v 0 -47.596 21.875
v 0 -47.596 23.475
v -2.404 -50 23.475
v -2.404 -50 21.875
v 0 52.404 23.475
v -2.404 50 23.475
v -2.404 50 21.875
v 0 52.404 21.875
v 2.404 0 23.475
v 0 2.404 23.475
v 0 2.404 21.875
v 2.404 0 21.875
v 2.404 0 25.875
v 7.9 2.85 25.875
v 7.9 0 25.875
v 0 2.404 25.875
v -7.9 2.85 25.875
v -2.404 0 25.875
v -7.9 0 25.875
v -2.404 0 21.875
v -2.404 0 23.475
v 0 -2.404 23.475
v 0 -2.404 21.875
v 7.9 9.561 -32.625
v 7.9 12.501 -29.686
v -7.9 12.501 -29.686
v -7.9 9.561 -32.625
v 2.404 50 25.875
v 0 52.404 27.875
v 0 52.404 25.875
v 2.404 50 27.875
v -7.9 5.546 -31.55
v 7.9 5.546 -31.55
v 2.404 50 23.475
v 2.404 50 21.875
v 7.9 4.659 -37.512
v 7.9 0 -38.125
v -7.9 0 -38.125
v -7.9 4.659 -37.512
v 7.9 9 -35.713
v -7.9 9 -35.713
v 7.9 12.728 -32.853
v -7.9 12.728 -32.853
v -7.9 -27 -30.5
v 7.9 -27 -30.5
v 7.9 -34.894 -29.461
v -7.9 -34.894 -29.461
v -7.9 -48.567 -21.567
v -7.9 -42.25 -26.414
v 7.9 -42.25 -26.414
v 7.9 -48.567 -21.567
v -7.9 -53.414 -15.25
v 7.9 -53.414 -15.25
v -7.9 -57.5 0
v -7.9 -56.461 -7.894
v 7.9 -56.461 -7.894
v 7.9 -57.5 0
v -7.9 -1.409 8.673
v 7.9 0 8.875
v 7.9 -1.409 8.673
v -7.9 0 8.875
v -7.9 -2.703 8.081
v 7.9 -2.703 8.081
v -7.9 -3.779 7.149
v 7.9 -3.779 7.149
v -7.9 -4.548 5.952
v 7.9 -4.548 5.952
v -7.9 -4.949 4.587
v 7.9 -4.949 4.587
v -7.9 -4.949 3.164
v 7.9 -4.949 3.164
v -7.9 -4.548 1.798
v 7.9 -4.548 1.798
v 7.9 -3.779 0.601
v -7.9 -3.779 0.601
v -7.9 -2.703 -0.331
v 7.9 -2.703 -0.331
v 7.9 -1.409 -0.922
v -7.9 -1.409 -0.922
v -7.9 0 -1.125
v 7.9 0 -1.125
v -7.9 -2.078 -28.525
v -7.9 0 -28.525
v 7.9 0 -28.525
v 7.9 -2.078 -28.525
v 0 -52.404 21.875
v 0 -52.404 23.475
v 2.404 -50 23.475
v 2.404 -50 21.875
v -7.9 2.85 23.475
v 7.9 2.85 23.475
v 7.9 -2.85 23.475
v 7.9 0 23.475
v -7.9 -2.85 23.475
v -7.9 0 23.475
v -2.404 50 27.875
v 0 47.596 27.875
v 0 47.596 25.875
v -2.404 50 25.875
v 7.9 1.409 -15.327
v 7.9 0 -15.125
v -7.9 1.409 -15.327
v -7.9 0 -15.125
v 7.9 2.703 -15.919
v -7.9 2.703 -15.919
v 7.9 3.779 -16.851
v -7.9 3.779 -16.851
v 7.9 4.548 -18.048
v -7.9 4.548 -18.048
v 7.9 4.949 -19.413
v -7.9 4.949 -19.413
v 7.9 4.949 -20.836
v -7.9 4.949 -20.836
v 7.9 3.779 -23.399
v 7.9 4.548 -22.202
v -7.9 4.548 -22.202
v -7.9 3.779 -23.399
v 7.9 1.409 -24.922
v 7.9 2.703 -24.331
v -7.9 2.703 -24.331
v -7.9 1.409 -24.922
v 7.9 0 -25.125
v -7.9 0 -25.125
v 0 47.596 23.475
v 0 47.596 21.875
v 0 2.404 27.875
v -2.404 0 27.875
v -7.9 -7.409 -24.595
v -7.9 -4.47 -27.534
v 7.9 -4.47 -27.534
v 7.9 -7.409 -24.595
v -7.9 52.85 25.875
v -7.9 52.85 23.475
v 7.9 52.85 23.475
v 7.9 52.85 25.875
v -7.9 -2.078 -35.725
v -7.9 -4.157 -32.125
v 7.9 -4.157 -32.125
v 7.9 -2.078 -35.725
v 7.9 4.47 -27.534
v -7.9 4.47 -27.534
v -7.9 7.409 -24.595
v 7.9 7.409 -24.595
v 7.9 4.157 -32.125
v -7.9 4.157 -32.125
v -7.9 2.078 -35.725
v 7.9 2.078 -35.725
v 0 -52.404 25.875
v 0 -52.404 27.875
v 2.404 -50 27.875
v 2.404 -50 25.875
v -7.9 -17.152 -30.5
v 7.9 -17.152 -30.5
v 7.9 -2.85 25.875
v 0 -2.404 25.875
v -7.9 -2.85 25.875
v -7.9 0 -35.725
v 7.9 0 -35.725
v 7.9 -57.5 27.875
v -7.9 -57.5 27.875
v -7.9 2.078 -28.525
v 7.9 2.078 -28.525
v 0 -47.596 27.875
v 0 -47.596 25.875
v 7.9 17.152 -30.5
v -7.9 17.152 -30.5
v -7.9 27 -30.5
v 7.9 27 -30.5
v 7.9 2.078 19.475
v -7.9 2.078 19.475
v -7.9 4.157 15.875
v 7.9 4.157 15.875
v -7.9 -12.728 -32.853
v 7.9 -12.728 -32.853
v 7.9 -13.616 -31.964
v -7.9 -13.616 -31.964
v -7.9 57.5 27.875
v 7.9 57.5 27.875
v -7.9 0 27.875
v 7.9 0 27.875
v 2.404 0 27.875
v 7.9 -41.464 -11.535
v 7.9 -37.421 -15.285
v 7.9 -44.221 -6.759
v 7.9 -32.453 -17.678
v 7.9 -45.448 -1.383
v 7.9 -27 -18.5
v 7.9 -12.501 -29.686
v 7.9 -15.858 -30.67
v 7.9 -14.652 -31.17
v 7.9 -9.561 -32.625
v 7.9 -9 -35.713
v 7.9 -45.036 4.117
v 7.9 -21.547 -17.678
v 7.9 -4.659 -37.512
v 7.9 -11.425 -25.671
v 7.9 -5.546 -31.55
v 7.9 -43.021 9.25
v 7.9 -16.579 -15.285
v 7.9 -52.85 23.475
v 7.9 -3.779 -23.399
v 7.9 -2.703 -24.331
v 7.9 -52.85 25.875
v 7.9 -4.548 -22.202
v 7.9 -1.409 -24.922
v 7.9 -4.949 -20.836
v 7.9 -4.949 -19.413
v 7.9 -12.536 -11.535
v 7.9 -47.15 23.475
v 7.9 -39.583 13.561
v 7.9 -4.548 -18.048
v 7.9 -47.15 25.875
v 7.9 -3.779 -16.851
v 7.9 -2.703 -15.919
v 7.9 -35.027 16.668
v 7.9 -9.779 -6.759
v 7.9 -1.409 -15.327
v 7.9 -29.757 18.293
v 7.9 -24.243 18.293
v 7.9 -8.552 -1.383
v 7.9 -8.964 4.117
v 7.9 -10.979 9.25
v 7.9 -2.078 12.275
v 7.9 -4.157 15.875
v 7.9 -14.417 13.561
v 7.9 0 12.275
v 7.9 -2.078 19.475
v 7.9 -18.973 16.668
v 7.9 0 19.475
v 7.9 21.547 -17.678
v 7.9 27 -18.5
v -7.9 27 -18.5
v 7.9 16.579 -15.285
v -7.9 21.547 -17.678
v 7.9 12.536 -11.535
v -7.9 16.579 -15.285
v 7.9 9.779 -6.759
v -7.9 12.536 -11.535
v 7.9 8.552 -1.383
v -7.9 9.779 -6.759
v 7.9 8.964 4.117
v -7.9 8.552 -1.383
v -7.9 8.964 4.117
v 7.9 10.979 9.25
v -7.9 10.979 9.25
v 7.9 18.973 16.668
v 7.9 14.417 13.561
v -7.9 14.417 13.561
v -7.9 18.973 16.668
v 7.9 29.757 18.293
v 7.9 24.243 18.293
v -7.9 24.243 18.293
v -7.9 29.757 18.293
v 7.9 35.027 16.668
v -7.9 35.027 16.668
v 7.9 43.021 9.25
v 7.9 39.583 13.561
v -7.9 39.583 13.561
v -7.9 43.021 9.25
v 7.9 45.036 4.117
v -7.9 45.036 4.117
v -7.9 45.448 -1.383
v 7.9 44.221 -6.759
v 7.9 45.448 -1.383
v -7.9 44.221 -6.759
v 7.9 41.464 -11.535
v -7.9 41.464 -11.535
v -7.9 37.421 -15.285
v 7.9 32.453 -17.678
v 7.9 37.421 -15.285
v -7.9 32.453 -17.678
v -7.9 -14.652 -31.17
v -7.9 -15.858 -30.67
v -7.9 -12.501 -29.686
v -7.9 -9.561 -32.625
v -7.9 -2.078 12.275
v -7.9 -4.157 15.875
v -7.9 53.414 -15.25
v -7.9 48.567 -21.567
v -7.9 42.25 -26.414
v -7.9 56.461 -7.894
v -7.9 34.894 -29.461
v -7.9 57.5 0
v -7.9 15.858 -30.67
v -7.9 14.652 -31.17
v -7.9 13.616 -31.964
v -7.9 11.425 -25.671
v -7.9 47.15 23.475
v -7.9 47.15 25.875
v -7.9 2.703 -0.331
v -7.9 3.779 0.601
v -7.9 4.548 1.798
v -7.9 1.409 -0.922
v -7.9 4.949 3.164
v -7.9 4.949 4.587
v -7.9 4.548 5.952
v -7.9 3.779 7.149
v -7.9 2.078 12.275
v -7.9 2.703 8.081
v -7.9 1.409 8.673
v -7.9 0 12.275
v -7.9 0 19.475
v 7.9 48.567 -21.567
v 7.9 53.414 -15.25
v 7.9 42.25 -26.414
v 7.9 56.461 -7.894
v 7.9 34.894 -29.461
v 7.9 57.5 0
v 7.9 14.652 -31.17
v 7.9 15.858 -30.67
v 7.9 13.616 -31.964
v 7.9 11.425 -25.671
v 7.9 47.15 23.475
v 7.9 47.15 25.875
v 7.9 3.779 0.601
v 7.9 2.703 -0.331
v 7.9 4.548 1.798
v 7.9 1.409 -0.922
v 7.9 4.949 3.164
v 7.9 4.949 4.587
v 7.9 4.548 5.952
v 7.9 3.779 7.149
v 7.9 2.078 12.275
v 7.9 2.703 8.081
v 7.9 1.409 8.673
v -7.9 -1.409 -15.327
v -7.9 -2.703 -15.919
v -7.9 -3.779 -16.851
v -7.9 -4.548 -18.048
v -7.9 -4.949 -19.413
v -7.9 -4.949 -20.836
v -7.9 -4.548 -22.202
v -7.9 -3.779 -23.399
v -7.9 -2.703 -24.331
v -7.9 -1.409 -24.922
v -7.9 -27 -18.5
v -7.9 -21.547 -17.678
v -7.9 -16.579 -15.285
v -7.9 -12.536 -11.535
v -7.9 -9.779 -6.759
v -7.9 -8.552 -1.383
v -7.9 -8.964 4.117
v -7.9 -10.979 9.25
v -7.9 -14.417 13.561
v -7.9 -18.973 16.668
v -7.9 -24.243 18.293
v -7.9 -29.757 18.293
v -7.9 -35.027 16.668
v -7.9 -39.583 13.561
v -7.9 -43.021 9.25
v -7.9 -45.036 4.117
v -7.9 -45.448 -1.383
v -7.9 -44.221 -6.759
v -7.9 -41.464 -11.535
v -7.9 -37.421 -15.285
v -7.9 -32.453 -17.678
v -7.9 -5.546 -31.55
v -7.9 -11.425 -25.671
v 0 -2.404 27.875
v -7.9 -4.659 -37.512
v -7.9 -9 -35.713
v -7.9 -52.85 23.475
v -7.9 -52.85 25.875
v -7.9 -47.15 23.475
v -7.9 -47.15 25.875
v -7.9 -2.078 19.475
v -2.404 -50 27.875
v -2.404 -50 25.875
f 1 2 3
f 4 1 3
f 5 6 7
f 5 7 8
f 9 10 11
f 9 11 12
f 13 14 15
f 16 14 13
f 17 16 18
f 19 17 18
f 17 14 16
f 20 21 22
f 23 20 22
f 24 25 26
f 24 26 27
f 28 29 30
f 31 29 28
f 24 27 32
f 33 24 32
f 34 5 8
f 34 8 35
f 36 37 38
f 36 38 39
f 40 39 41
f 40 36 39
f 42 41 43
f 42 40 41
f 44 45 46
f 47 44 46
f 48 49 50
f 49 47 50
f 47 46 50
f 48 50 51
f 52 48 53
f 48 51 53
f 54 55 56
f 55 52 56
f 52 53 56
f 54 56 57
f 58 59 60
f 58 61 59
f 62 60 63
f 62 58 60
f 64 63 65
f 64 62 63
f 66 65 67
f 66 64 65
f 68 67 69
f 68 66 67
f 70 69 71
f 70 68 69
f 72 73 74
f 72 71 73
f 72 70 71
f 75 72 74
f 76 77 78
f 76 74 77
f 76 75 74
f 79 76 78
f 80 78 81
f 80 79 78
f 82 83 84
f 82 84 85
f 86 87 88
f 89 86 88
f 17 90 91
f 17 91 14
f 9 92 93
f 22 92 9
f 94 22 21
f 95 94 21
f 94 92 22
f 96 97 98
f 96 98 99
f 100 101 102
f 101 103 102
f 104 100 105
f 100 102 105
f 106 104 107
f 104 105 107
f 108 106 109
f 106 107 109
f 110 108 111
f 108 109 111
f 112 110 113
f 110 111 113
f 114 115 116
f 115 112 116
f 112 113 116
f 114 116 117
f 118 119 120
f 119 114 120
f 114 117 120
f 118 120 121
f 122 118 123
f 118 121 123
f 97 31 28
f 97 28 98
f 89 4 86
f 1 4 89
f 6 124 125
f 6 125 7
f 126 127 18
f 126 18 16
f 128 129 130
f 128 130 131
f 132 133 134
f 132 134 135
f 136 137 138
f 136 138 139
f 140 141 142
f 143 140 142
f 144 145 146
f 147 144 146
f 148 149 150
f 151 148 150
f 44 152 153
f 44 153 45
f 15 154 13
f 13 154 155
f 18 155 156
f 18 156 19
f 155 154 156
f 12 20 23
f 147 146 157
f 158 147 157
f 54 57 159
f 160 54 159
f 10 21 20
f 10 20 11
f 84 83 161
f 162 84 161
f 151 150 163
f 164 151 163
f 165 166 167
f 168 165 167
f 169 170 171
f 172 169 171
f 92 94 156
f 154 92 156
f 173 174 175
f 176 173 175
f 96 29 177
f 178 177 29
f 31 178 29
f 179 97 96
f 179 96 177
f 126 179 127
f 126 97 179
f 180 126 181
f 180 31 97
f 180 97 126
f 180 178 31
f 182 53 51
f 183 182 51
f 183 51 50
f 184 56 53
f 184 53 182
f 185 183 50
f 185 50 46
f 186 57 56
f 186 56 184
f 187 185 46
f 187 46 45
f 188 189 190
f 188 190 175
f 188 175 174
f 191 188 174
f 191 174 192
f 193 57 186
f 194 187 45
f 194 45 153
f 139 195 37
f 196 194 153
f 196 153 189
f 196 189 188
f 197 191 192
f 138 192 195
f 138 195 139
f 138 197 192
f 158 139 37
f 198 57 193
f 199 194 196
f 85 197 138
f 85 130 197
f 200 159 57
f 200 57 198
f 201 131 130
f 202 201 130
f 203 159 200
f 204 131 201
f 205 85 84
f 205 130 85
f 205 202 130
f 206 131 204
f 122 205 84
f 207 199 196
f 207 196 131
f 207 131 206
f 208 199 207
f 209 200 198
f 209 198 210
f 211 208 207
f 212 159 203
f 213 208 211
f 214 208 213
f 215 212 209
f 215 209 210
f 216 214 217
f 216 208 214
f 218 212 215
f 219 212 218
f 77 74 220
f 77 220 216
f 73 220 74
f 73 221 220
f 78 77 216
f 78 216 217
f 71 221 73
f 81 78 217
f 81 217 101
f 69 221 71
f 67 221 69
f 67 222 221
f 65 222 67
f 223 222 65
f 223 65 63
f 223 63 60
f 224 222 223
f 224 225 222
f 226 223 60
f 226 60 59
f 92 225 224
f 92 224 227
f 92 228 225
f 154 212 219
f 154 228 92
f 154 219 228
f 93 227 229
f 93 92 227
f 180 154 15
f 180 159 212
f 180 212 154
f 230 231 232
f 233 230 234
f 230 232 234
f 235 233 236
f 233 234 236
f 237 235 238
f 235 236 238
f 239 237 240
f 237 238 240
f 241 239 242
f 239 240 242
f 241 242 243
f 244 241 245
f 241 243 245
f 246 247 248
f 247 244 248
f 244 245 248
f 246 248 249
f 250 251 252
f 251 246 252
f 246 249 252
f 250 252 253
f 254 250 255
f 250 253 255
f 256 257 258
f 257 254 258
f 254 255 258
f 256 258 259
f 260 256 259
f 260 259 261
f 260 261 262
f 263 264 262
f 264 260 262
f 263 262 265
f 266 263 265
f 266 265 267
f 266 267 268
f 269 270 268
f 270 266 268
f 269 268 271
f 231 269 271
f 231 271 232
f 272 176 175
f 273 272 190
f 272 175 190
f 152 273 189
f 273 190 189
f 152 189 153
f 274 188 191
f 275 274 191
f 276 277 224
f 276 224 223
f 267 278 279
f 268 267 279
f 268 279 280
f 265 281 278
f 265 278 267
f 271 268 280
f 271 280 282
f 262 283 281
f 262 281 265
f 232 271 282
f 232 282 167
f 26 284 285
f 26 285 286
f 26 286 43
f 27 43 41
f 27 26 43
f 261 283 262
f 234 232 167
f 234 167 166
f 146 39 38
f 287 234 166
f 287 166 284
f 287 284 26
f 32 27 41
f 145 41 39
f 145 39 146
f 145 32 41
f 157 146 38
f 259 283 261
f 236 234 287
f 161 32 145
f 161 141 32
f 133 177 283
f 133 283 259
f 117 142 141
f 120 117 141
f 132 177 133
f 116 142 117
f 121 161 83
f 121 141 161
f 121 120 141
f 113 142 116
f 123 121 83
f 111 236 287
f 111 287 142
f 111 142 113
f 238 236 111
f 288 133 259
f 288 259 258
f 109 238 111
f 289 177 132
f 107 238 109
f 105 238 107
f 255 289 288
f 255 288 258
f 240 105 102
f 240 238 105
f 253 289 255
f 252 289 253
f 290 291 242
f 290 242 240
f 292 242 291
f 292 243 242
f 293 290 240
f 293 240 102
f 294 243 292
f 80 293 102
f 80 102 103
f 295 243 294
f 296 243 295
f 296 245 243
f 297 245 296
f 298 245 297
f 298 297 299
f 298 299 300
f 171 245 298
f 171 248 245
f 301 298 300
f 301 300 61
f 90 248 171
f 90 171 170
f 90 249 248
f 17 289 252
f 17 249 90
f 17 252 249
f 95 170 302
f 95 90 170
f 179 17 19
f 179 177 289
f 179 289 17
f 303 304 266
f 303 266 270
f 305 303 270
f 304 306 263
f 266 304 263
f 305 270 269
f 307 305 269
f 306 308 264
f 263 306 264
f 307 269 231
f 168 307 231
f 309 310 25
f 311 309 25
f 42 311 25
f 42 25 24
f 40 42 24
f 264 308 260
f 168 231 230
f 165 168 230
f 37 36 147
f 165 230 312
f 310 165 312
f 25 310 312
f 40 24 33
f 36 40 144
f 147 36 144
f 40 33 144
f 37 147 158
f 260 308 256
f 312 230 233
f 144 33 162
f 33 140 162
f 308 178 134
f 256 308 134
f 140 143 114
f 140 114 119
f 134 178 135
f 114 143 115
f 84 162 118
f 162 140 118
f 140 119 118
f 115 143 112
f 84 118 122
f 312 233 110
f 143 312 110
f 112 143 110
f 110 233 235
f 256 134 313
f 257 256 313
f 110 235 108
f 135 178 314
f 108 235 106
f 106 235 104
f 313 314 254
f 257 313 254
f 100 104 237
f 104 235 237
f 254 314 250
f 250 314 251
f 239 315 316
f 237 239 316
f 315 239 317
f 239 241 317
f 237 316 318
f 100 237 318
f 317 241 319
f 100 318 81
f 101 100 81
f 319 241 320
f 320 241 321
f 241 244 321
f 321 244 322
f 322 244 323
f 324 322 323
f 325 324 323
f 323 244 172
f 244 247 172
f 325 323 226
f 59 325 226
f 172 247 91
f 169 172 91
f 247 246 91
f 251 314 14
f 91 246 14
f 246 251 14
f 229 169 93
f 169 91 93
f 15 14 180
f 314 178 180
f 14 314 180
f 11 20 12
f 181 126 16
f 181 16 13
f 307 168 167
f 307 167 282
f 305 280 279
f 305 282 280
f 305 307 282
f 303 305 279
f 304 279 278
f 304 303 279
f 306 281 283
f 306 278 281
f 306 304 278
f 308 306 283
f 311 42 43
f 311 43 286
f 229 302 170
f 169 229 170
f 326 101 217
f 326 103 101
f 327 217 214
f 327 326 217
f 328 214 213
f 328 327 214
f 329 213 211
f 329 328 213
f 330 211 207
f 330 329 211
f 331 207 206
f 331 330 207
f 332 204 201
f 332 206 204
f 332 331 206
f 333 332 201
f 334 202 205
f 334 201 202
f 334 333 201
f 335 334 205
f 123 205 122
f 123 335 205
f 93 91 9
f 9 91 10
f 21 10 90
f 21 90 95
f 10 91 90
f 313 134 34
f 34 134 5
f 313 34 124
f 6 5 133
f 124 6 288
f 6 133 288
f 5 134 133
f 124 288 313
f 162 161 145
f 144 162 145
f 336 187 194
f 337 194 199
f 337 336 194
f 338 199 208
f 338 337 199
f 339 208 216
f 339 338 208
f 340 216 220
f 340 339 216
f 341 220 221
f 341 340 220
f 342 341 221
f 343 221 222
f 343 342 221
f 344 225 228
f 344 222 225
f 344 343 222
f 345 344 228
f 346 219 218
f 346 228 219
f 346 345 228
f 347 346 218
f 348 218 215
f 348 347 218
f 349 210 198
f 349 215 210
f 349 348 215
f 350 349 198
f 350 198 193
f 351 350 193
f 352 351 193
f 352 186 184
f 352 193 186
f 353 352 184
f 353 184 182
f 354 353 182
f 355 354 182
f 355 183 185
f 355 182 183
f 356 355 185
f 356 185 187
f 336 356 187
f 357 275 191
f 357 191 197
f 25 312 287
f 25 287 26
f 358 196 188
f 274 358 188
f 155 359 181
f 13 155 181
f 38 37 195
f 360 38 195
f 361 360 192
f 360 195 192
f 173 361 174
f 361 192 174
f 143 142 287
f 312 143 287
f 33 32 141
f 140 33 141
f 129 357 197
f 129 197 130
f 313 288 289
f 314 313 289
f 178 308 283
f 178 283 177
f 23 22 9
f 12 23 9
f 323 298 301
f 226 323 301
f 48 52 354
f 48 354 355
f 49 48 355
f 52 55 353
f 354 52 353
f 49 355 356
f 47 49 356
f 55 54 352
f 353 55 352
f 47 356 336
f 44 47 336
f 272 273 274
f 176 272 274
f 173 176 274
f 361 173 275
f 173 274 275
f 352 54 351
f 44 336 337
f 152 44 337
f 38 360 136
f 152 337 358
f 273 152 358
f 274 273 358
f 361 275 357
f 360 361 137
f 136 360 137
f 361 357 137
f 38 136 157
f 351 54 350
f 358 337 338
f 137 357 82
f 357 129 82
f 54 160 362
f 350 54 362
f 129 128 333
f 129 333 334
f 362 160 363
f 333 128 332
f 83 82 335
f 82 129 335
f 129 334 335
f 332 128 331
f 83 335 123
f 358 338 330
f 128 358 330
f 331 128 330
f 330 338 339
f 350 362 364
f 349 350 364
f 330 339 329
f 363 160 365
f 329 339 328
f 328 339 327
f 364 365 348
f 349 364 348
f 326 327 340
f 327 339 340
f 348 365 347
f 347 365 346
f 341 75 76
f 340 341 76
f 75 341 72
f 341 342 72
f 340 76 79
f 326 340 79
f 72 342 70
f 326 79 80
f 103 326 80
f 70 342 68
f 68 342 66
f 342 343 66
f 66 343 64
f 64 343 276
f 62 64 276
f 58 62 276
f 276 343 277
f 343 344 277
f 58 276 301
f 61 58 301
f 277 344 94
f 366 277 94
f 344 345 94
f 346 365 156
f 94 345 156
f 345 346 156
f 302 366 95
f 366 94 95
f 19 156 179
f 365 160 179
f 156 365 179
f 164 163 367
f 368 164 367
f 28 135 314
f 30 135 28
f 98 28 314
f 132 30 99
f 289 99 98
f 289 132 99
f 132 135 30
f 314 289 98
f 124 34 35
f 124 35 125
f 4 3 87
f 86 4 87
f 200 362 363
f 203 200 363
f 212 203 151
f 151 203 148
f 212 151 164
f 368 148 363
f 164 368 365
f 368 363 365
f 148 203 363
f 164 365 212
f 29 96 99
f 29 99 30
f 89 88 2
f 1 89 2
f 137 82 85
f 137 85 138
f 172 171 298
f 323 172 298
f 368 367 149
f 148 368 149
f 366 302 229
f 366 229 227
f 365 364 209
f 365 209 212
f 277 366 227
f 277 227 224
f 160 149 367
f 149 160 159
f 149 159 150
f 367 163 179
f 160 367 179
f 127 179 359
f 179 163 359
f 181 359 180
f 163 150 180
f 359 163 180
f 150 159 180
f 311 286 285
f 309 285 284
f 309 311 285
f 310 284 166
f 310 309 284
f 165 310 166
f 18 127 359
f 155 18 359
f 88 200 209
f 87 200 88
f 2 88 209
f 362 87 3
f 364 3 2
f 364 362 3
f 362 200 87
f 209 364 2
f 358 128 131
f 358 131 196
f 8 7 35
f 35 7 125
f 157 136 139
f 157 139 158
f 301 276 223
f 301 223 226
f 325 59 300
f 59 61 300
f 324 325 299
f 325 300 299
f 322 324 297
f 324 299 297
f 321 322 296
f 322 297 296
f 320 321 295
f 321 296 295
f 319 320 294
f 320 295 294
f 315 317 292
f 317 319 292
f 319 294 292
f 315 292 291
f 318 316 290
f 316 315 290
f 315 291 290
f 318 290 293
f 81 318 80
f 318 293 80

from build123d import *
from build123d.topology import SkipClean

# Parameters (mm, degrees)
BOSS_EXTRUDE1_DEPTH     = 8
CUT_EXTRUDE1_DEPTH      = 78.453287602
CUT_EXTRUDE1_DEPTH_BACK = 70.453287602
CUT_EXTRUDE1_START      = -8
SKETCH9_R               = 5
CUT_EXTRUDE2_DEPTH      = 70.453287602
CUT_EXTRUDE2_DEPTH_BACK = 70.453287602
CUT_EXTRUDE3_DEPTH      = 70.453287602
CUT_EXTRUDE3_DEPTH_BACK = 70.453287602
SKETCH11_R              = 18.5
CUT_EXTRUDE4_DEPTH      = 70.453287602
CUT_EXTRUDE4_DEPTH_BACK = 70.453287602
SKETCH12_W              = 5.7
SKETCH12_H              = 2.4
CUT_EXTRUDE5_START      = 27.875085
CUT_EXTRUDE5_DEPTH      = 6
MOVE_START              = -8
MOVE_FACE1_OUTLINE_W    = 5.7
MOVE_FACE1_OUTLINE_H    = 2.4
MOVE_FACE1_OUTLINE_R    = 18.5
MOVE_FACE1_DEPTH        = 0.1
MOVE_START_2            = 7.9
MOVE_FACE1_2_OUTLINE_W  = 5.7
MOVE_FACE1_2_OUTLINE_H  = 2.4
MOVE_FACE1_2_OUTLINE_R  = 18.5
MOVE_FACE1_2_DEPTH      = 0.1


# Read off the part's stored shape, not the designer's step: Move Face1
with BuildPart() as part:
    # Sketch2 → Boss-Extrude1 (new, symmetric)
    with BuildSketch(Plane.YZ):
        with BuildLine():
            Line((-12.727922061, -32.852837258), (-13.616293225, -31.964466094))
            ThreePointArc((-13.616293225, -31.964466094), (-15.238409969, -30.880602337), (-17.151827131, -30.5))
            Line((-17.151827131, -30.5), (-27, -30.5))
            ThreePointArc((-27, -30.5), (-48.566756826, -21.566756826), (-57.5, 0))
            Line((-57.5, 0), (-57.5, 27.875084803))
            Line((-57.5, 27.875084803), (0, 27.875084803))
            Line((0, 27.875084803), (0, -38.124915197))
            ThreePointArc((0, -38.124915197), (-6.888301783, -36.754746782), (-12.727922061, -32.852837258))
        make_face()
    extrude(amount=BOSS_EXTRUDE1_DEPTH, both=True)

    # Sketch9 → Cut-Extrude1 (cut, two sides: drawn at the far end of the back side and taken through both)
    with BuildSketch(Plane.YZ.offset(CUT_EXTRUDE1_START - CUT_EXTRUDE1_DEPTH_BACK)):
        with Locations((0, 3.875084803)):
            Circle(SKETCH9_R)
        with Locations((0, -20.124915197)):
            Circle(SKETCH9_R)
    extrude(amount=CUT_EXTRUDE1_DEPTH + CUT_EXTRUDE1_DEPTH_BACK, mode=Mode.SUBTRACT)

    # Sketch10 → Cut-Extrude2 (cut, two sides: drawn at the far end of the back side and taken through both)
    with BuildSketch(Plane.YZ.offset(-CUT_EXTRUDE2_DEPTH_BACK)):
        Polygon((2.078460969, 12.275084803), (4.156921938, 15.875084803), (2.078460969, 19.475084803), (-2.078460969, 19.475084803), (-4.156921938, 15.875084803), (-2.078460969, 12.275084803), align=None)
        Polygon((-5.545893683, -31.549584262), (-4.470003116, -27.534306004), (-7.409390808, -24.594918313), (-11.424669066, -25.67080888), (-12.500559632, -29.686087138), (-9.561171941, -32.625474829), align=None)
        Polygon((4.156921938, -32.124915197), (2.078460969, -28.524915197), (-2.078460969, -28.524915197), (-4.156921938, -32.124915197), (-2.078460969, -35.724915197), (2.078460969, -35.724915197), align=None)
        Polygon((12.500559632, -29.686087138), (11.424669066, -25.67080888), (7.409390808, -24.594918313), (4.470003116, -27.534306004), (5.545893683, -31.549584262), (9.561171941, -32.625474829), align=None)
    extrude(amount=CUT_EXTRUDE2_DEPTH + CUT_EXTRUDE2_DEPTH_BACK, mode=Mode.SUBTRACT)

    # Sketch11 → Cut-Extrude3 (cut, two sides: drawn at the far end of the back side and taken through both)
    with BuildSketch(Plane.YZ.offset(-CUT_EXTRUDE3_DEPTH_BACK)):
        with Locations(Location((-27, 0, 0), (0, 0, 270))):
            Circle(SKETCH11_R)
    extrude(amount=CUT_EXTRUDE3_DEPTH + CUT_EXTRUDE3_DEPTH_BACK, mode=Mode.SUBTRACT)

    # Sketch12 → Cut-Extrude4 (cut, two sides: drawn at the far end of the back side and taken through both)
    with BuildSketch(Plane.YZ.offset(-CUT_EXTRUDE4_DEPTH_BACK)):
        with Locations((-50, 24.675084803)):
            Rectangle(SKETCH12_W, SKETCH12_H)
        with Locations((0, 24.675084803)):
            Rectangle(SKETCH12_W, SKETCH12_H)
    extrude(amount=CUT_EXTRUDE4_DEPTH + CUT_EXTRUDE4_DEPTH_BACK, mode=Mode.SUBTRACT)

    # Sketch13 → Cut-Extrude5 (cut)
    with BuildSketch(Plane.XY.offset(CUT_EXTRUDE5_START)):
        Polygon((0, -2.404163056), (2.404163056, 0), (0, 2.404163056), (-2.404163056, 0), align=None)
        Polygon((0, -52.404163056), (2.404163056, -50), (0, -47.595836944), (-2.404163056, -50), align=None)
    extrude(amount=-CUT_EXTRUDE5_DEPTH, mode=Mode.SUBTRACT)

    # Move Face1 outline → Move Face1 (cut)
    with BuildSketch(Plane.YZ.offset(MOVE_START)):
        with BuildLine():
            Line((-2.85, 25.875084803), (0, 25.875084803))
            Line((0, 25.875084803), (0, 27.875084803))
            Line((0, 27.875084803), (-57.5, 27.875084803))
            Line((-57.5, 27.875084803), (-57.5, 0))
            ThreePointArc((-57.5, 0), (-48.566756826, -21.566756826), (-27, -30.5))
            Line((-27, -30.5), (-17.151827131, -30.5))
            ThreePointArc((-17.151827131, -30.5), (-15.238409969, -30.880602337), (-13.616293225, -31.964466094))
            Line((-13.616293225, -31.964466094), (-12.727922061, -32.852837258))
            ThreePointArc((-12.727922061, -32.852837258), (-6.888301783, -36.754746782), (0, -38.124915197))
            Line((0, -38.124915197), (0, -35.724915197))
            Line((0, -35.724915197), (-2.078460969, -35.724915197))
            Line((-2.078460969, -35.724915197), (-4.156921938, -32.124915197))
            Line((-4.156921938, -32.124915197), (-2.078460969, -28.524915197))
            Line((-2.078460969, -28.524915197), (0, -28.524915197))
            Line((0, -28.524915197), (0, -25.124915197))
            ThreePointArc((0, -25.124915197), (-5, -20.124915197), (0, -15.124915197))
            Line((0, -15.124915197), (0, -1.124915197))
            ThreePointArc((0, -1.124915197), (-5, 3.875084803), (0, 8.875084803))
            Line((0, 8.875084803), (0, 12.275084803))
            Line((0, 12.275084803), (-2.078460969, 12.275084803))
            Line((-2.078460969, 12.275084803), (-4.156921938, 15.875084803))
            Line((-4.156921938, 15.875084803), (-2.078460969, 19.475084803))
            Line((-2.078460969, 19.475084803), (0, 19.475084803))
            Line((0, 19.475084803), (0, 23.475084803))
            Line((0, 23.475084803), (-2.85, 23.475084803))
            Line((-2.85, 23.475084803), (-2.85, 25.875084803))
        make_face()
        Polygon((-5.545893683, -31.549584262), (-9.561171941, -32.625474829), (-12.500559632, -29.686087138), (-11.424669066, -25.67080888), (-7.409390808, -24.594918313), (-4.470003116, -27.534306004), align=None, mode=Mode.SUBTRACT)
        with Locations((-50, 24.675084803)):
            Rectangle(MOVE_FACE1_OUTLINE_W, MOVE_FACE1_OUTLINE_H, mode=Mode.SUBTRACT)
        with Locations((-27, 0)):
            Circle(MOVE_FACE1_OUTLINE_R, mode=Mode.SUBTRACT)
    extrude(amount=MOVE_FACE1_DEPTH, mode=Mode.SUBTRACT)

    # Move Face1 2 outline → Move Face1 2 (cut)
    with BuildSketch(Plane.YZ.offset(MOVE_START_2)):
        with BuildLine():
            Line((-2.85, 25.875084803), (0, 25.875084803))
            Line((0, 25.875084803), (0, 27.875084803))
            Line((0, 27.875084803), (-57.5, 27.875084803))
            Line((-57.5, 27.875084803), (-57.5, 0))
            ThreePointArc((-57.5, 0), (-48.566756826, -21.566756826), (-27, -30.5))
            Line((-27, -30.5), (-17.151827131, -30.5))
            ThreePointArc((-17.151827131, -30.5), (-15.238409969, -30.880602337), (-13.616293225, -31.964466094))
            Line((-13.616293225, -31.964466094), (-12.727922061, -32.852837258))
            ThreePointArc((-12.727922061, -32.852837258), (-6.888301783, -36.754746782), (0, -38.124915197))
            Line((0, -38.124915197), (0, -35.724915197))
            Line((0, -35.724915197), (-2.078460969, -35.724915197))
            Line((-2.078460969, -35.724915197), (-4.156921938, -32.124915197))
            Line((-4.156921938, -32.124915197), (-2.078460969, -28.524915197))
            Line((-2.078460969, -28.524915197), (0, -28.524915197))
            Line((0, -28.524915197), (0, -25.124915197))
            ThreePointArc((0, -25.124915197), (-5, -20.124915197), (0, -15.124915197))
            Line((0, -15.124915197), (0, -1.124915197))
            ThreePointArc((0, -1.124915197), (-5, 3.875084803), (0, 8.875084803))
            Line((0, 8.875084803), (0, 12.275084803))
            Line((0, 12.275084803), (-2.078460969, 12.275084803))
            Line((-2.078460969, 12.275084803), (-4.156921938, 15.875084803))
            Line((-4.156921938, 15.875084803), (-2.078460969, 19.475084803))
            Line((-2.078460969, 19.475084803), (0, 19.475084803))
            Line((0, 19.475084803), (0, 23.475084803))
            Line((0, 23.475084803), (-2.85, 23.475084803))
            Line((-2.85, 23.475084803), (-2.85, 25.875084803))
        make_face()
        Polygon((-5.545893683, -31.549584262), (-9.561171941, -32.625474829), (-12.500559632, -29.686087138), (-11.424669066, -25.67080888), (-7.409390808, -24.594918313), (-4.470003116, -27.534306004), align=None, mode=Mode.SUBTRACT)
        with Locations((-50, 24.675084803)):
            Rectangle(MOVE_FACE1_2_OUTLINE_W, MOVE_FACE1_2_OUTLINE_H, mode=Mode.SUBTRACT)
        with Locations((-27, 0)):
            Circle(MOVE_FACE1_2_OUTLINE_R, mode=Mode.SUBTRACT)
    extrude(amount=MOVE_FACE1_2_DEPTH, mode=Mode.SUBTRACT)

    # Mirror1: part across plane


with BuildPart() as part_1:
    with SkipClean():  # the faces are left unmerged after this step: merging them gives an invalid solid
        add(part.part)
        add(part.part.mirror(Plane(origin=(0, 0, 0), x_dir=(0, 0, 1), z_dir=(0, -1, 0))))


solid = part_1.part
